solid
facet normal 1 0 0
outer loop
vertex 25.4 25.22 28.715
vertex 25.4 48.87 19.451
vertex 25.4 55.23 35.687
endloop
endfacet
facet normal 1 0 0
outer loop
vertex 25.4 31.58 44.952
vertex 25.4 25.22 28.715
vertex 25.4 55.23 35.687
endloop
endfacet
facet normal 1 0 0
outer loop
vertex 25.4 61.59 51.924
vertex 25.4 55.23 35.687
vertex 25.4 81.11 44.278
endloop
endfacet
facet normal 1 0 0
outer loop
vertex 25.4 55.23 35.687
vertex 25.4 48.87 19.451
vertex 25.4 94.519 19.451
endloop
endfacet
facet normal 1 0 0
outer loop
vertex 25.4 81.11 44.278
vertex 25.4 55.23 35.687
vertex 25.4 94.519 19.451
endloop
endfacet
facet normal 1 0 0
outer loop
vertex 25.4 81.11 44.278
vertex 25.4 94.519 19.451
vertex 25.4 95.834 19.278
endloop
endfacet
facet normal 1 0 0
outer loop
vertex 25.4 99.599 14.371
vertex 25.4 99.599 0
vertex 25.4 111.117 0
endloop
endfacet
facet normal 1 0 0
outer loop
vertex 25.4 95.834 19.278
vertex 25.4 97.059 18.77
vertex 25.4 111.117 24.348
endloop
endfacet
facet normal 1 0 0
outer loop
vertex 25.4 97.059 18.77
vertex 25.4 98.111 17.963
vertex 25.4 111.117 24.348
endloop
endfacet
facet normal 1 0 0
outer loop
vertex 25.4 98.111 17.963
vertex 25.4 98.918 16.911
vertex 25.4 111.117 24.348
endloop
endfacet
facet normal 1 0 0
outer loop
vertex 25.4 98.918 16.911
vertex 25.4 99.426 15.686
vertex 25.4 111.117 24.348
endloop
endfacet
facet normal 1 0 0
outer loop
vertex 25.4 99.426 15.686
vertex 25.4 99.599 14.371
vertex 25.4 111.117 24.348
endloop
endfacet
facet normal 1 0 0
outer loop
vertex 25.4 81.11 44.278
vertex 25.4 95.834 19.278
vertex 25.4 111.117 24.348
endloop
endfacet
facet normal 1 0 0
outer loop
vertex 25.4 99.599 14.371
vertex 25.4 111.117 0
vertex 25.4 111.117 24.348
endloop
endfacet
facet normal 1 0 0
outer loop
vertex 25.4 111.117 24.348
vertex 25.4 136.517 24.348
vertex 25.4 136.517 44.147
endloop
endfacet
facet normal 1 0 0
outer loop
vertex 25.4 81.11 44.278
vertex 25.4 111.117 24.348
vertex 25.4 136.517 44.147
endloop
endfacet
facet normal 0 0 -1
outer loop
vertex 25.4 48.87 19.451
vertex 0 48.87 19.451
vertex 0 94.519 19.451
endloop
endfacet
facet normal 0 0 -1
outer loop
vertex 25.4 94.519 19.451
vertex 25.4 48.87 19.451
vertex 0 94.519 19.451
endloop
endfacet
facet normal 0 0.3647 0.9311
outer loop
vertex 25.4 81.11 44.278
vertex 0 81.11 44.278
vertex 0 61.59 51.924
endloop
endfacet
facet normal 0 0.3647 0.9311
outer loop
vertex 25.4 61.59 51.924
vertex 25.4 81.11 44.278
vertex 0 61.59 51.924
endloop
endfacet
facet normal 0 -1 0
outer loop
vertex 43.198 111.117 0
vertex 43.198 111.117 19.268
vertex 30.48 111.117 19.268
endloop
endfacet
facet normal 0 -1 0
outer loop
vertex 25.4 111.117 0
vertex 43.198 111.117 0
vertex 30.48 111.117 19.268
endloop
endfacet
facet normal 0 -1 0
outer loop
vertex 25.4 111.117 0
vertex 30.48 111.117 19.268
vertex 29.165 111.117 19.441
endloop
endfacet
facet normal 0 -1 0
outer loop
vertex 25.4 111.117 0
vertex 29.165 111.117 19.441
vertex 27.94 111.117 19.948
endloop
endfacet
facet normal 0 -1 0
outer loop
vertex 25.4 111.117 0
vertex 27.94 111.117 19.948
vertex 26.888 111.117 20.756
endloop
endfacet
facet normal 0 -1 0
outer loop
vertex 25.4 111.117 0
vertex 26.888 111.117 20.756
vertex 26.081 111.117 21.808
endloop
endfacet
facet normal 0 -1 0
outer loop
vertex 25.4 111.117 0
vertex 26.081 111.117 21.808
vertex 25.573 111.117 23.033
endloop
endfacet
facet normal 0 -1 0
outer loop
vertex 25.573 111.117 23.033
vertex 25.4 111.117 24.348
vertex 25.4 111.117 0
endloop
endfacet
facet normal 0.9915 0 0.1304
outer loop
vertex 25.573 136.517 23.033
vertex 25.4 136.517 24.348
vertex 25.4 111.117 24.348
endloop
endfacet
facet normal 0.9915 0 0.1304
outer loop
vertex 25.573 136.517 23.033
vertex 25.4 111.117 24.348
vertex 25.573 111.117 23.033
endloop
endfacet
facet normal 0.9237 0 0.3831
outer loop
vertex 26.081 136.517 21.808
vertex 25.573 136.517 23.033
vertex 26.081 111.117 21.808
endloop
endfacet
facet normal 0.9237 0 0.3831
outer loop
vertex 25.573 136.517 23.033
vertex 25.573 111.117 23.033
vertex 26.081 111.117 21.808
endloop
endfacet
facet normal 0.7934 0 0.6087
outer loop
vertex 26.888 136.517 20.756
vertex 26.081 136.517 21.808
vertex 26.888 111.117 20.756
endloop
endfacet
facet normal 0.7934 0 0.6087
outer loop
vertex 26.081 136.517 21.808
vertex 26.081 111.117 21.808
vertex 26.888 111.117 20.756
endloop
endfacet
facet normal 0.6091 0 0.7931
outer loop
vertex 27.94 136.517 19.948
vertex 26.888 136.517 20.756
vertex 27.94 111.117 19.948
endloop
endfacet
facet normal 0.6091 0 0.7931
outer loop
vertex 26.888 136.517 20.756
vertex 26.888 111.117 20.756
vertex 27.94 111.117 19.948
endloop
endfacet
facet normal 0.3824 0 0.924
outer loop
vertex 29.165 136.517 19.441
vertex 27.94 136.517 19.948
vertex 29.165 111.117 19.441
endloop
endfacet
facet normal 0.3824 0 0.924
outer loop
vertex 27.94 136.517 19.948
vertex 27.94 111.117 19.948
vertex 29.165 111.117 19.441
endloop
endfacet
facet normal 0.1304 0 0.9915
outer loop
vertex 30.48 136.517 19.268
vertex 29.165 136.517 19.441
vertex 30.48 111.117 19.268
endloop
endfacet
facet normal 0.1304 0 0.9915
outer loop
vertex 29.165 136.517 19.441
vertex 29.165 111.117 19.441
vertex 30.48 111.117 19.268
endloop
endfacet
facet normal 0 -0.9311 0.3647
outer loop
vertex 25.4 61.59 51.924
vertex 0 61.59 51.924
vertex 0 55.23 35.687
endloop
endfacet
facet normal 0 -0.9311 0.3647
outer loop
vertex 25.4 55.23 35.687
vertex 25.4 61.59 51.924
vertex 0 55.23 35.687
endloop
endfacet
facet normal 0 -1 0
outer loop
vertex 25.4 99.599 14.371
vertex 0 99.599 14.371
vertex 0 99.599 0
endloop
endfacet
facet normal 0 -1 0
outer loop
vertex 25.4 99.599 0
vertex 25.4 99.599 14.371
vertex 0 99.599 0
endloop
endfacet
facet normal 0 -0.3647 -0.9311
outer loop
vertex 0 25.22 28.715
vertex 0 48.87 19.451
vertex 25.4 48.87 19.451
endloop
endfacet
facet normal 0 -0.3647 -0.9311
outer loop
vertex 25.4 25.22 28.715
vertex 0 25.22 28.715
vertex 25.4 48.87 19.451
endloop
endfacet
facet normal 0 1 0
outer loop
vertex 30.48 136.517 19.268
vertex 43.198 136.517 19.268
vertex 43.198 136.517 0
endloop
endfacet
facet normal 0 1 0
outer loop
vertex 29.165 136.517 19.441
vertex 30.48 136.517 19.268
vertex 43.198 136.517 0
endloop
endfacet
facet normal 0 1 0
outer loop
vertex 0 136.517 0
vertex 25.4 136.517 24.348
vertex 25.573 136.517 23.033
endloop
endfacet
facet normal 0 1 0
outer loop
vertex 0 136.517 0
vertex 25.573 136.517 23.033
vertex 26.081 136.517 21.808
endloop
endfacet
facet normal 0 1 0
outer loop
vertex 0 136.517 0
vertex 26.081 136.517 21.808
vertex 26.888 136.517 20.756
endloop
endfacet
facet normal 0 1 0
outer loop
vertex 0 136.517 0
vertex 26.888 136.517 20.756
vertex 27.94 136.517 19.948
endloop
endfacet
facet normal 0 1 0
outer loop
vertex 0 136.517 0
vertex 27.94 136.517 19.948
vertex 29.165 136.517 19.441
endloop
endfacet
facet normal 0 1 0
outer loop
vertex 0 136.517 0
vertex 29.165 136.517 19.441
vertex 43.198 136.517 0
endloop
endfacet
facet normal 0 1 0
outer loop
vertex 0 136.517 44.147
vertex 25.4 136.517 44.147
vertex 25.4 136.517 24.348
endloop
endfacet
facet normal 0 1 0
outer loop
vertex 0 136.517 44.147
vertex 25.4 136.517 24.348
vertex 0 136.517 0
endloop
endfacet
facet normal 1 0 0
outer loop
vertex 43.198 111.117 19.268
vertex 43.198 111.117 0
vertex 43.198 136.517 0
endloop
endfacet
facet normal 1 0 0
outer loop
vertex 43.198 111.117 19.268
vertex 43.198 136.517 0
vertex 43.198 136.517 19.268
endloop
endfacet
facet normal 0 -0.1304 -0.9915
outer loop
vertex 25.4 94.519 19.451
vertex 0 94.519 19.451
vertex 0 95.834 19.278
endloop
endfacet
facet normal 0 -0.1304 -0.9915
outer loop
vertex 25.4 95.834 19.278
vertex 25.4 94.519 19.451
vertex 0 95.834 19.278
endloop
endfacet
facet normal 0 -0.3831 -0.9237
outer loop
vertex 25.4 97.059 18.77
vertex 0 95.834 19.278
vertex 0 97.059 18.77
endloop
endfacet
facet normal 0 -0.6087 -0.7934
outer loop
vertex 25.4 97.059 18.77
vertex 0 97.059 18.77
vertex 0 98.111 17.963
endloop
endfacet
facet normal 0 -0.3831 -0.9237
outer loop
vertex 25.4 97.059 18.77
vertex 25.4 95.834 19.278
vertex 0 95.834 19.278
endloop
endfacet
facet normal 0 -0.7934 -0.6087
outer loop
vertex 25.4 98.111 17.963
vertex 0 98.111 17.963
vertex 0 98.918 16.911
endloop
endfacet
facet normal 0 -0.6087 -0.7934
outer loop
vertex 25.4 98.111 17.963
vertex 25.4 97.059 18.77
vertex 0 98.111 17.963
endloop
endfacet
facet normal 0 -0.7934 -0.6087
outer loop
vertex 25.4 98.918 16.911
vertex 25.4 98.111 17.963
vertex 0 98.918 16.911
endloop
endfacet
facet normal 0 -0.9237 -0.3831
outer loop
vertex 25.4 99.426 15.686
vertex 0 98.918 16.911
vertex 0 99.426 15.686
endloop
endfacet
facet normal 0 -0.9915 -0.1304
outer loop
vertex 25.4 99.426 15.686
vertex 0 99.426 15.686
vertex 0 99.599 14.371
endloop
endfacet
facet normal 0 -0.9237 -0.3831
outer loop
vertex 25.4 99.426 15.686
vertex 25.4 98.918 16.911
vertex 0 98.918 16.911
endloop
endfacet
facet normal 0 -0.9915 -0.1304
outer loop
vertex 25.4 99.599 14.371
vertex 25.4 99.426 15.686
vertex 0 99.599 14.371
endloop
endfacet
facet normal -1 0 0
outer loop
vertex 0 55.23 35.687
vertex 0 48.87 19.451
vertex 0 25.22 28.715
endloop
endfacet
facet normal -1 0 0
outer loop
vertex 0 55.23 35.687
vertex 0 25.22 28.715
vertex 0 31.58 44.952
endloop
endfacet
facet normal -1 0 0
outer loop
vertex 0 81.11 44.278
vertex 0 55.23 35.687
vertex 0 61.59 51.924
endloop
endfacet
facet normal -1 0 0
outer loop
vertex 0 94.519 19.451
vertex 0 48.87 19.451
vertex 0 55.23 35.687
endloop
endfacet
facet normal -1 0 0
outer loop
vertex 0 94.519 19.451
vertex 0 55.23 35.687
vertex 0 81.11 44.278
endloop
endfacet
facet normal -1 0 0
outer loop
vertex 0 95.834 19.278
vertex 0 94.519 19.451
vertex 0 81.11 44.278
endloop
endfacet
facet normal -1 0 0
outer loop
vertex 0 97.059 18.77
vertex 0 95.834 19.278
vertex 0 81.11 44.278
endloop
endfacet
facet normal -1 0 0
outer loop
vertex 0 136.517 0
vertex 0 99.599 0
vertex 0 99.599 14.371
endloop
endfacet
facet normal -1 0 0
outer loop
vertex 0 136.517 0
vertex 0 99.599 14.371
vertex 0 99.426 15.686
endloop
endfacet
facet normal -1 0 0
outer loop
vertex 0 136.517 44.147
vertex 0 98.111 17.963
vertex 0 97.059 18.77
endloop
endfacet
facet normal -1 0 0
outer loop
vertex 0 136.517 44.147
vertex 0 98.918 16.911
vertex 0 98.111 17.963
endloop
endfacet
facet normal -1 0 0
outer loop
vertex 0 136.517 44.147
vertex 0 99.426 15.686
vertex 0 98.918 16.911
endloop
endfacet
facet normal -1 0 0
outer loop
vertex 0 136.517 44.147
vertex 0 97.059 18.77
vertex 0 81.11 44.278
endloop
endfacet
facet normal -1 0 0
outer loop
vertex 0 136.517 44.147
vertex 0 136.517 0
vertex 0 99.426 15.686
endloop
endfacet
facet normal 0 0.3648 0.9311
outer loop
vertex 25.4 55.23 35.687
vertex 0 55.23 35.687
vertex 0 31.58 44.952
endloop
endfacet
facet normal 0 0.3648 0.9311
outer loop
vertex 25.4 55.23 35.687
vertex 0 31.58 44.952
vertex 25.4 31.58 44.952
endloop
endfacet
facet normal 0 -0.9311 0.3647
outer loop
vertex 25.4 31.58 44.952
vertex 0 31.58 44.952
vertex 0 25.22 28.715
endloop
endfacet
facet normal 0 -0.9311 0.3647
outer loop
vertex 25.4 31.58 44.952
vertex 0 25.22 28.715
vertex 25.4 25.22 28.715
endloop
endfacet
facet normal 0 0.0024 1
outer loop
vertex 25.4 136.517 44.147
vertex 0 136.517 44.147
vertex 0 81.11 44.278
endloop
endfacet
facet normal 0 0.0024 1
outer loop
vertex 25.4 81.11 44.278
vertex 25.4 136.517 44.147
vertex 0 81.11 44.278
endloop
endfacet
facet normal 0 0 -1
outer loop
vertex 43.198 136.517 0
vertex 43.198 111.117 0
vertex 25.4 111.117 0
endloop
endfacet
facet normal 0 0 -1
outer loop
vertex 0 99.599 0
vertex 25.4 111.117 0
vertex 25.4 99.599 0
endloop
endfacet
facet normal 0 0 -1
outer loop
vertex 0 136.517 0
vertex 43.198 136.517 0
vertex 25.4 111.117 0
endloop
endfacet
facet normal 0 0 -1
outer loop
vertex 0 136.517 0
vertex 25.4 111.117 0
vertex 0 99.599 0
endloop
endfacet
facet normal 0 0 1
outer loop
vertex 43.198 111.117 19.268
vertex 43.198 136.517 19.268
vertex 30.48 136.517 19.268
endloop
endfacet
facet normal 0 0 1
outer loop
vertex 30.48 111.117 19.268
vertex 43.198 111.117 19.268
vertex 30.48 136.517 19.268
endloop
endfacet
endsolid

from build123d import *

# Parameters (mm, degrees)
F1_DEPTH = 25.4
F2_R     = 5.08
F3_W     = 25.4
F3_H     = 17.4376570841
F4_DEPTH = 25.4
F5_W     = 17.797825551
F5_H     = 19.2676950246
F6_DEPTH = 25.4
F7_R     = 5.08


with BuildPart() as f1:
    # F0 (on Right) → F1 (new body)
    with BuildSketch(Plane.YZ):
        Polygon((136.5167200565, 44.1473908722), (81.1095386744, 44.2778617144), (61.5900829434, 51.9239269197), (48.8699753419, 19.451070548), (99.5989143848, 19.451070548), (99.5989143848, 0), (136.5167200565, 0), align=None)
    extrude(amount=F1_DEPTH)

    # F2
    f2_edges = [f1.edges().sort_by_distance(p)[0] for p in [
        (12.7, 99.598914, 19.451071),
    ]]
    fillet(f2_edges, radius=F2_R)

    # F3 (on face) → F4 (join)
    with BuildSketch(Plane(origin=(0, 35.7631713916, -14.0089736199), x_dir=(1, 0, 0), z_dir=(0, -0.9311129418, 0.3647309825))):
        with Locations((12.7, 44.6543661825)):
            Rectangle(F3_W, F3_H)
    extrude(amount=F4_DEPTH)

    # F5 (on face) → F6 (join)
    with BuildSketch(Plane(origin=(0, 136.5167200565, 0), x_dir=(-1, 0, 0), z_dir=(0, 1, 0))):
        with Locations((-34.2989127755, 9.6338475123)):
            Rectangle(F5_W, F5_H)
    extrude(amount=-F6_DEPTH)

    # F7
    f7_edges = [f1.edges().sort_by_distance(p)[0] for p in [
        (25.4, 123.81672, 19.267695),
    ]]
    fillet(f7_edges, radius=F7_R)


solid = f1.part
